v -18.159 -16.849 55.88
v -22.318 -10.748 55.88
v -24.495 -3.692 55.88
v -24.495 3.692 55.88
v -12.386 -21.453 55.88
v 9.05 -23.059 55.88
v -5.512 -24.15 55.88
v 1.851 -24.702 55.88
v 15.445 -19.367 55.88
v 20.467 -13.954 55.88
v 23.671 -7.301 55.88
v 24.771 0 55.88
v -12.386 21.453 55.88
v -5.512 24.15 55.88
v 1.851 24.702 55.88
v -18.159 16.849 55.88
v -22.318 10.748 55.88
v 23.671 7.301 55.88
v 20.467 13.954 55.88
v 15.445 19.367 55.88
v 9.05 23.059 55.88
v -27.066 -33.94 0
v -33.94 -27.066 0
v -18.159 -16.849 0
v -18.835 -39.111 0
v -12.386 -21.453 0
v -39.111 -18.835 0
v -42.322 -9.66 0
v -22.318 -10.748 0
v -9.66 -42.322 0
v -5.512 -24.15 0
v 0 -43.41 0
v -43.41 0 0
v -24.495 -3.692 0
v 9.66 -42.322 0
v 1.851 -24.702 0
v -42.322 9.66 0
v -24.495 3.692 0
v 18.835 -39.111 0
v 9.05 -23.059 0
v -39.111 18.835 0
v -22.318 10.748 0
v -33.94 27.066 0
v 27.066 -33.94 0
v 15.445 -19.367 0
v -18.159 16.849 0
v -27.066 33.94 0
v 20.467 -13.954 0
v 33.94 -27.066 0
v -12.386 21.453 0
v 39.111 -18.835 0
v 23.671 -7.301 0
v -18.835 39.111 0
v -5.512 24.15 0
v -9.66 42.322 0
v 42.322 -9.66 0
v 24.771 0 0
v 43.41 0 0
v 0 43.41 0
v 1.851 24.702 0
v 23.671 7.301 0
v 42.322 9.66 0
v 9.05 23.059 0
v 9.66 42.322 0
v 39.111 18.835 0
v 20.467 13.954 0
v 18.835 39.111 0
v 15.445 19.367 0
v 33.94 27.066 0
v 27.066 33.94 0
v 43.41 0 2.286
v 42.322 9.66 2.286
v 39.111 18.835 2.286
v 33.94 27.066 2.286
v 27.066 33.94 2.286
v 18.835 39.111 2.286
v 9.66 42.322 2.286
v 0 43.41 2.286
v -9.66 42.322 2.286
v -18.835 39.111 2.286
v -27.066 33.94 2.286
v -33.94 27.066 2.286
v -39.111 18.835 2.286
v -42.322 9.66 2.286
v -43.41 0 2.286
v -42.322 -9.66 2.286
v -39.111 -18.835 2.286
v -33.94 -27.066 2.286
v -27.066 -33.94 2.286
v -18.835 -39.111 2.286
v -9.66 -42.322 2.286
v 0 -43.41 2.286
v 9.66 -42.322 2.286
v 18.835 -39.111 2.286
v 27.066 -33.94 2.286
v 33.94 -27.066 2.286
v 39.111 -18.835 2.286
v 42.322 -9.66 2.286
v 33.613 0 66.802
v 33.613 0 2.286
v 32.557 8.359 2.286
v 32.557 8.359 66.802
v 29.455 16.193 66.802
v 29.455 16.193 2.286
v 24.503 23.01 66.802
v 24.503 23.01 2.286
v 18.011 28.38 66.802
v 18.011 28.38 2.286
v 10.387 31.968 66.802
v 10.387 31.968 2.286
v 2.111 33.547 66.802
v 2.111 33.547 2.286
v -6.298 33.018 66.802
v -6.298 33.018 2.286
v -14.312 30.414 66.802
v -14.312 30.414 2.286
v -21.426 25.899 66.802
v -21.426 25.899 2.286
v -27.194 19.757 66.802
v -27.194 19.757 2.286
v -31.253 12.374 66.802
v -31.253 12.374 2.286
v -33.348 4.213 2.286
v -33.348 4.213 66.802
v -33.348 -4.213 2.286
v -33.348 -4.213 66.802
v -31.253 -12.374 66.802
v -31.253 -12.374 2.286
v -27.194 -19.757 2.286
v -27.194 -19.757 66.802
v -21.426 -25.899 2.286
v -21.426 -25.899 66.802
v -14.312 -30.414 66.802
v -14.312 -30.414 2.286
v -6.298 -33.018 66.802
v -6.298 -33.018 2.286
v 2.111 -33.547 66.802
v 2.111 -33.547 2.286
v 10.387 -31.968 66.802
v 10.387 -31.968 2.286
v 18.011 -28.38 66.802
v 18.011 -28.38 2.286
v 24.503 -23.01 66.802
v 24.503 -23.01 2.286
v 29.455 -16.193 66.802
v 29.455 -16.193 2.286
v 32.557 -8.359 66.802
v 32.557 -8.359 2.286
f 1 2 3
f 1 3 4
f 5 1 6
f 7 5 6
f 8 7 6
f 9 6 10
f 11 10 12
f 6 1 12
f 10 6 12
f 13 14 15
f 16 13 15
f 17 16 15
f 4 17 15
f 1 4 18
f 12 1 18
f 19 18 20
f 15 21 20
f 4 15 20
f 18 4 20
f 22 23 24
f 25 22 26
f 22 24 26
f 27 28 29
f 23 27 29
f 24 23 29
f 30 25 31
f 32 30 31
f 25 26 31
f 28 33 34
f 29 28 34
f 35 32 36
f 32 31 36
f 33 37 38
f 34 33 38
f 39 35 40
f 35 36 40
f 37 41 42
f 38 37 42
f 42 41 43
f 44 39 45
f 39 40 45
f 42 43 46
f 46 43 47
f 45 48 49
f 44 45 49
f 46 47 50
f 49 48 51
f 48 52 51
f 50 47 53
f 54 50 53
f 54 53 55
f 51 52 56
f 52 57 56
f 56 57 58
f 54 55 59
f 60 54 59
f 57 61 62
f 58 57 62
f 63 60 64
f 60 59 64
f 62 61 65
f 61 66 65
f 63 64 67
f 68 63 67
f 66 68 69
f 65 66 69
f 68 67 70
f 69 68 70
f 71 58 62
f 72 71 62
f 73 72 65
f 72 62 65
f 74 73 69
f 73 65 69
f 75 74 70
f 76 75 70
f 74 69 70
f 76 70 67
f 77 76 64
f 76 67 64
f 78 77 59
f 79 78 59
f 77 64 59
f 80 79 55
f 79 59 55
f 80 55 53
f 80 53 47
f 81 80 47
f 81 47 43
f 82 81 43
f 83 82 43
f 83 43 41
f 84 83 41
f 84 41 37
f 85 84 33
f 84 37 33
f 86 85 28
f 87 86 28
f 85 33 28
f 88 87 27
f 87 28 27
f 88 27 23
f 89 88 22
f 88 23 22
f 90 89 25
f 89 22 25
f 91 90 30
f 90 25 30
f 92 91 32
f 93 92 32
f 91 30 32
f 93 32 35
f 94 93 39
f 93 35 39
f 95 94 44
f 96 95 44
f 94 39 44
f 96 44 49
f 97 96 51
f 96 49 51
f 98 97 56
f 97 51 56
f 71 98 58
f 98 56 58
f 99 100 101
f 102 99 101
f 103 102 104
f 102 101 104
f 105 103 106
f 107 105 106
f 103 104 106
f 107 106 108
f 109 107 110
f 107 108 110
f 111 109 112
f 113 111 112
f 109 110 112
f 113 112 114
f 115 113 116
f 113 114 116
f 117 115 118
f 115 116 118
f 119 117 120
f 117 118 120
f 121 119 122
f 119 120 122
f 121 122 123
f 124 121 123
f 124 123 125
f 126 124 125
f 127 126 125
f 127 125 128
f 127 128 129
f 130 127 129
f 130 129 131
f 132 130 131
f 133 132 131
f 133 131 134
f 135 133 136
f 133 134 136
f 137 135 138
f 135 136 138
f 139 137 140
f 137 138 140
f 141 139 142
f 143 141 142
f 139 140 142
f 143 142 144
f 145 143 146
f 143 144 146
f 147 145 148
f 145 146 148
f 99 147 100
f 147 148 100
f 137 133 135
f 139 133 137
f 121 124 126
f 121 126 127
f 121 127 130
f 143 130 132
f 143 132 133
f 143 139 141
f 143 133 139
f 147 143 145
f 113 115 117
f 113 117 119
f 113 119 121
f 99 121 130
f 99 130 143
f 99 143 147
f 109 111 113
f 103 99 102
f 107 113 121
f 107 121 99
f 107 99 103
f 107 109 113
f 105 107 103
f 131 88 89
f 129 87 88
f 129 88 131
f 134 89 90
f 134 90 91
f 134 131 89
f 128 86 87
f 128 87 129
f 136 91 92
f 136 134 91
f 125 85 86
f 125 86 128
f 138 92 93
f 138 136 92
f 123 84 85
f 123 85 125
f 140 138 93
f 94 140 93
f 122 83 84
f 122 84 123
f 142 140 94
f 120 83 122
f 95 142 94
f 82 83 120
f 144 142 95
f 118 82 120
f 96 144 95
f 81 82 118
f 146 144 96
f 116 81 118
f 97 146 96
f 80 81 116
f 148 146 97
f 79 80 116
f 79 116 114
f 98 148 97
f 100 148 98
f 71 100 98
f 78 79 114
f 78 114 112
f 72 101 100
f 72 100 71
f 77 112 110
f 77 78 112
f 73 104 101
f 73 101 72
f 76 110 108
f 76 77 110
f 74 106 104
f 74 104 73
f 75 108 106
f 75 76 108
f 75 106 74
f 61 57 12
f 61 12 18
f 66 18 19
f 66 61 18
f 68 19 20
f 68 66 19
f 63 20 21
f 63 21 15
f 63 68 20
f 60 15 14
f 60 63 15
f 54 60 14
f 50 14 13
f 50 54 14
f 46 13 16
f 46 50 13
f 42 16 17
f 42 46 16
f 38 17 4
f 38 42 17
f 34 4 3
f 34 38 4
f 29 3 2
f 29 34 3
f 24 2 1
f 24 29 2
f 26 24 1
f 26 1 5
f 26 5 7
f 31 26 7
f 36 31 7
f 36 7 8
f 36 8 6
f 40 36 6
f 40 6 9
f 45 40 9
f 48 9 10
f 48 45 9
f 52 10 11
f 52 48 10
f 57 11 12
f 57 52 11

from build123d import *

# Parameters (mm, degrees)
F0_R     = 43.410456
F1_DEPTH = 2.286
F2_R     = 33.613067
F3_DEPTH = 64.516
F4_R     = 24.771227
F5_DEPTH = 55.88


with BuildPart() as f1:
    # F0 (on Top) → F1 (new body)
    with BuildSketch(Plane.XY):
        Circle(F0_R)
    extrude(amount=F1_DEPTH)

    # F2 (on face) → F3 (join)
    with BuildSketch(Plane.XY.offset(2.286)):
        Circle(F2_R)
    extrude(amount=F3_DEPTH)

    # F4 (on Top) → F5 (cut)
    with BuildSketch(Plane.XY):
        Circle(F4_R)
    extrude(amount=F5_DEPTH, mode=Mode.SUBTRACT)


solid = f1.part
